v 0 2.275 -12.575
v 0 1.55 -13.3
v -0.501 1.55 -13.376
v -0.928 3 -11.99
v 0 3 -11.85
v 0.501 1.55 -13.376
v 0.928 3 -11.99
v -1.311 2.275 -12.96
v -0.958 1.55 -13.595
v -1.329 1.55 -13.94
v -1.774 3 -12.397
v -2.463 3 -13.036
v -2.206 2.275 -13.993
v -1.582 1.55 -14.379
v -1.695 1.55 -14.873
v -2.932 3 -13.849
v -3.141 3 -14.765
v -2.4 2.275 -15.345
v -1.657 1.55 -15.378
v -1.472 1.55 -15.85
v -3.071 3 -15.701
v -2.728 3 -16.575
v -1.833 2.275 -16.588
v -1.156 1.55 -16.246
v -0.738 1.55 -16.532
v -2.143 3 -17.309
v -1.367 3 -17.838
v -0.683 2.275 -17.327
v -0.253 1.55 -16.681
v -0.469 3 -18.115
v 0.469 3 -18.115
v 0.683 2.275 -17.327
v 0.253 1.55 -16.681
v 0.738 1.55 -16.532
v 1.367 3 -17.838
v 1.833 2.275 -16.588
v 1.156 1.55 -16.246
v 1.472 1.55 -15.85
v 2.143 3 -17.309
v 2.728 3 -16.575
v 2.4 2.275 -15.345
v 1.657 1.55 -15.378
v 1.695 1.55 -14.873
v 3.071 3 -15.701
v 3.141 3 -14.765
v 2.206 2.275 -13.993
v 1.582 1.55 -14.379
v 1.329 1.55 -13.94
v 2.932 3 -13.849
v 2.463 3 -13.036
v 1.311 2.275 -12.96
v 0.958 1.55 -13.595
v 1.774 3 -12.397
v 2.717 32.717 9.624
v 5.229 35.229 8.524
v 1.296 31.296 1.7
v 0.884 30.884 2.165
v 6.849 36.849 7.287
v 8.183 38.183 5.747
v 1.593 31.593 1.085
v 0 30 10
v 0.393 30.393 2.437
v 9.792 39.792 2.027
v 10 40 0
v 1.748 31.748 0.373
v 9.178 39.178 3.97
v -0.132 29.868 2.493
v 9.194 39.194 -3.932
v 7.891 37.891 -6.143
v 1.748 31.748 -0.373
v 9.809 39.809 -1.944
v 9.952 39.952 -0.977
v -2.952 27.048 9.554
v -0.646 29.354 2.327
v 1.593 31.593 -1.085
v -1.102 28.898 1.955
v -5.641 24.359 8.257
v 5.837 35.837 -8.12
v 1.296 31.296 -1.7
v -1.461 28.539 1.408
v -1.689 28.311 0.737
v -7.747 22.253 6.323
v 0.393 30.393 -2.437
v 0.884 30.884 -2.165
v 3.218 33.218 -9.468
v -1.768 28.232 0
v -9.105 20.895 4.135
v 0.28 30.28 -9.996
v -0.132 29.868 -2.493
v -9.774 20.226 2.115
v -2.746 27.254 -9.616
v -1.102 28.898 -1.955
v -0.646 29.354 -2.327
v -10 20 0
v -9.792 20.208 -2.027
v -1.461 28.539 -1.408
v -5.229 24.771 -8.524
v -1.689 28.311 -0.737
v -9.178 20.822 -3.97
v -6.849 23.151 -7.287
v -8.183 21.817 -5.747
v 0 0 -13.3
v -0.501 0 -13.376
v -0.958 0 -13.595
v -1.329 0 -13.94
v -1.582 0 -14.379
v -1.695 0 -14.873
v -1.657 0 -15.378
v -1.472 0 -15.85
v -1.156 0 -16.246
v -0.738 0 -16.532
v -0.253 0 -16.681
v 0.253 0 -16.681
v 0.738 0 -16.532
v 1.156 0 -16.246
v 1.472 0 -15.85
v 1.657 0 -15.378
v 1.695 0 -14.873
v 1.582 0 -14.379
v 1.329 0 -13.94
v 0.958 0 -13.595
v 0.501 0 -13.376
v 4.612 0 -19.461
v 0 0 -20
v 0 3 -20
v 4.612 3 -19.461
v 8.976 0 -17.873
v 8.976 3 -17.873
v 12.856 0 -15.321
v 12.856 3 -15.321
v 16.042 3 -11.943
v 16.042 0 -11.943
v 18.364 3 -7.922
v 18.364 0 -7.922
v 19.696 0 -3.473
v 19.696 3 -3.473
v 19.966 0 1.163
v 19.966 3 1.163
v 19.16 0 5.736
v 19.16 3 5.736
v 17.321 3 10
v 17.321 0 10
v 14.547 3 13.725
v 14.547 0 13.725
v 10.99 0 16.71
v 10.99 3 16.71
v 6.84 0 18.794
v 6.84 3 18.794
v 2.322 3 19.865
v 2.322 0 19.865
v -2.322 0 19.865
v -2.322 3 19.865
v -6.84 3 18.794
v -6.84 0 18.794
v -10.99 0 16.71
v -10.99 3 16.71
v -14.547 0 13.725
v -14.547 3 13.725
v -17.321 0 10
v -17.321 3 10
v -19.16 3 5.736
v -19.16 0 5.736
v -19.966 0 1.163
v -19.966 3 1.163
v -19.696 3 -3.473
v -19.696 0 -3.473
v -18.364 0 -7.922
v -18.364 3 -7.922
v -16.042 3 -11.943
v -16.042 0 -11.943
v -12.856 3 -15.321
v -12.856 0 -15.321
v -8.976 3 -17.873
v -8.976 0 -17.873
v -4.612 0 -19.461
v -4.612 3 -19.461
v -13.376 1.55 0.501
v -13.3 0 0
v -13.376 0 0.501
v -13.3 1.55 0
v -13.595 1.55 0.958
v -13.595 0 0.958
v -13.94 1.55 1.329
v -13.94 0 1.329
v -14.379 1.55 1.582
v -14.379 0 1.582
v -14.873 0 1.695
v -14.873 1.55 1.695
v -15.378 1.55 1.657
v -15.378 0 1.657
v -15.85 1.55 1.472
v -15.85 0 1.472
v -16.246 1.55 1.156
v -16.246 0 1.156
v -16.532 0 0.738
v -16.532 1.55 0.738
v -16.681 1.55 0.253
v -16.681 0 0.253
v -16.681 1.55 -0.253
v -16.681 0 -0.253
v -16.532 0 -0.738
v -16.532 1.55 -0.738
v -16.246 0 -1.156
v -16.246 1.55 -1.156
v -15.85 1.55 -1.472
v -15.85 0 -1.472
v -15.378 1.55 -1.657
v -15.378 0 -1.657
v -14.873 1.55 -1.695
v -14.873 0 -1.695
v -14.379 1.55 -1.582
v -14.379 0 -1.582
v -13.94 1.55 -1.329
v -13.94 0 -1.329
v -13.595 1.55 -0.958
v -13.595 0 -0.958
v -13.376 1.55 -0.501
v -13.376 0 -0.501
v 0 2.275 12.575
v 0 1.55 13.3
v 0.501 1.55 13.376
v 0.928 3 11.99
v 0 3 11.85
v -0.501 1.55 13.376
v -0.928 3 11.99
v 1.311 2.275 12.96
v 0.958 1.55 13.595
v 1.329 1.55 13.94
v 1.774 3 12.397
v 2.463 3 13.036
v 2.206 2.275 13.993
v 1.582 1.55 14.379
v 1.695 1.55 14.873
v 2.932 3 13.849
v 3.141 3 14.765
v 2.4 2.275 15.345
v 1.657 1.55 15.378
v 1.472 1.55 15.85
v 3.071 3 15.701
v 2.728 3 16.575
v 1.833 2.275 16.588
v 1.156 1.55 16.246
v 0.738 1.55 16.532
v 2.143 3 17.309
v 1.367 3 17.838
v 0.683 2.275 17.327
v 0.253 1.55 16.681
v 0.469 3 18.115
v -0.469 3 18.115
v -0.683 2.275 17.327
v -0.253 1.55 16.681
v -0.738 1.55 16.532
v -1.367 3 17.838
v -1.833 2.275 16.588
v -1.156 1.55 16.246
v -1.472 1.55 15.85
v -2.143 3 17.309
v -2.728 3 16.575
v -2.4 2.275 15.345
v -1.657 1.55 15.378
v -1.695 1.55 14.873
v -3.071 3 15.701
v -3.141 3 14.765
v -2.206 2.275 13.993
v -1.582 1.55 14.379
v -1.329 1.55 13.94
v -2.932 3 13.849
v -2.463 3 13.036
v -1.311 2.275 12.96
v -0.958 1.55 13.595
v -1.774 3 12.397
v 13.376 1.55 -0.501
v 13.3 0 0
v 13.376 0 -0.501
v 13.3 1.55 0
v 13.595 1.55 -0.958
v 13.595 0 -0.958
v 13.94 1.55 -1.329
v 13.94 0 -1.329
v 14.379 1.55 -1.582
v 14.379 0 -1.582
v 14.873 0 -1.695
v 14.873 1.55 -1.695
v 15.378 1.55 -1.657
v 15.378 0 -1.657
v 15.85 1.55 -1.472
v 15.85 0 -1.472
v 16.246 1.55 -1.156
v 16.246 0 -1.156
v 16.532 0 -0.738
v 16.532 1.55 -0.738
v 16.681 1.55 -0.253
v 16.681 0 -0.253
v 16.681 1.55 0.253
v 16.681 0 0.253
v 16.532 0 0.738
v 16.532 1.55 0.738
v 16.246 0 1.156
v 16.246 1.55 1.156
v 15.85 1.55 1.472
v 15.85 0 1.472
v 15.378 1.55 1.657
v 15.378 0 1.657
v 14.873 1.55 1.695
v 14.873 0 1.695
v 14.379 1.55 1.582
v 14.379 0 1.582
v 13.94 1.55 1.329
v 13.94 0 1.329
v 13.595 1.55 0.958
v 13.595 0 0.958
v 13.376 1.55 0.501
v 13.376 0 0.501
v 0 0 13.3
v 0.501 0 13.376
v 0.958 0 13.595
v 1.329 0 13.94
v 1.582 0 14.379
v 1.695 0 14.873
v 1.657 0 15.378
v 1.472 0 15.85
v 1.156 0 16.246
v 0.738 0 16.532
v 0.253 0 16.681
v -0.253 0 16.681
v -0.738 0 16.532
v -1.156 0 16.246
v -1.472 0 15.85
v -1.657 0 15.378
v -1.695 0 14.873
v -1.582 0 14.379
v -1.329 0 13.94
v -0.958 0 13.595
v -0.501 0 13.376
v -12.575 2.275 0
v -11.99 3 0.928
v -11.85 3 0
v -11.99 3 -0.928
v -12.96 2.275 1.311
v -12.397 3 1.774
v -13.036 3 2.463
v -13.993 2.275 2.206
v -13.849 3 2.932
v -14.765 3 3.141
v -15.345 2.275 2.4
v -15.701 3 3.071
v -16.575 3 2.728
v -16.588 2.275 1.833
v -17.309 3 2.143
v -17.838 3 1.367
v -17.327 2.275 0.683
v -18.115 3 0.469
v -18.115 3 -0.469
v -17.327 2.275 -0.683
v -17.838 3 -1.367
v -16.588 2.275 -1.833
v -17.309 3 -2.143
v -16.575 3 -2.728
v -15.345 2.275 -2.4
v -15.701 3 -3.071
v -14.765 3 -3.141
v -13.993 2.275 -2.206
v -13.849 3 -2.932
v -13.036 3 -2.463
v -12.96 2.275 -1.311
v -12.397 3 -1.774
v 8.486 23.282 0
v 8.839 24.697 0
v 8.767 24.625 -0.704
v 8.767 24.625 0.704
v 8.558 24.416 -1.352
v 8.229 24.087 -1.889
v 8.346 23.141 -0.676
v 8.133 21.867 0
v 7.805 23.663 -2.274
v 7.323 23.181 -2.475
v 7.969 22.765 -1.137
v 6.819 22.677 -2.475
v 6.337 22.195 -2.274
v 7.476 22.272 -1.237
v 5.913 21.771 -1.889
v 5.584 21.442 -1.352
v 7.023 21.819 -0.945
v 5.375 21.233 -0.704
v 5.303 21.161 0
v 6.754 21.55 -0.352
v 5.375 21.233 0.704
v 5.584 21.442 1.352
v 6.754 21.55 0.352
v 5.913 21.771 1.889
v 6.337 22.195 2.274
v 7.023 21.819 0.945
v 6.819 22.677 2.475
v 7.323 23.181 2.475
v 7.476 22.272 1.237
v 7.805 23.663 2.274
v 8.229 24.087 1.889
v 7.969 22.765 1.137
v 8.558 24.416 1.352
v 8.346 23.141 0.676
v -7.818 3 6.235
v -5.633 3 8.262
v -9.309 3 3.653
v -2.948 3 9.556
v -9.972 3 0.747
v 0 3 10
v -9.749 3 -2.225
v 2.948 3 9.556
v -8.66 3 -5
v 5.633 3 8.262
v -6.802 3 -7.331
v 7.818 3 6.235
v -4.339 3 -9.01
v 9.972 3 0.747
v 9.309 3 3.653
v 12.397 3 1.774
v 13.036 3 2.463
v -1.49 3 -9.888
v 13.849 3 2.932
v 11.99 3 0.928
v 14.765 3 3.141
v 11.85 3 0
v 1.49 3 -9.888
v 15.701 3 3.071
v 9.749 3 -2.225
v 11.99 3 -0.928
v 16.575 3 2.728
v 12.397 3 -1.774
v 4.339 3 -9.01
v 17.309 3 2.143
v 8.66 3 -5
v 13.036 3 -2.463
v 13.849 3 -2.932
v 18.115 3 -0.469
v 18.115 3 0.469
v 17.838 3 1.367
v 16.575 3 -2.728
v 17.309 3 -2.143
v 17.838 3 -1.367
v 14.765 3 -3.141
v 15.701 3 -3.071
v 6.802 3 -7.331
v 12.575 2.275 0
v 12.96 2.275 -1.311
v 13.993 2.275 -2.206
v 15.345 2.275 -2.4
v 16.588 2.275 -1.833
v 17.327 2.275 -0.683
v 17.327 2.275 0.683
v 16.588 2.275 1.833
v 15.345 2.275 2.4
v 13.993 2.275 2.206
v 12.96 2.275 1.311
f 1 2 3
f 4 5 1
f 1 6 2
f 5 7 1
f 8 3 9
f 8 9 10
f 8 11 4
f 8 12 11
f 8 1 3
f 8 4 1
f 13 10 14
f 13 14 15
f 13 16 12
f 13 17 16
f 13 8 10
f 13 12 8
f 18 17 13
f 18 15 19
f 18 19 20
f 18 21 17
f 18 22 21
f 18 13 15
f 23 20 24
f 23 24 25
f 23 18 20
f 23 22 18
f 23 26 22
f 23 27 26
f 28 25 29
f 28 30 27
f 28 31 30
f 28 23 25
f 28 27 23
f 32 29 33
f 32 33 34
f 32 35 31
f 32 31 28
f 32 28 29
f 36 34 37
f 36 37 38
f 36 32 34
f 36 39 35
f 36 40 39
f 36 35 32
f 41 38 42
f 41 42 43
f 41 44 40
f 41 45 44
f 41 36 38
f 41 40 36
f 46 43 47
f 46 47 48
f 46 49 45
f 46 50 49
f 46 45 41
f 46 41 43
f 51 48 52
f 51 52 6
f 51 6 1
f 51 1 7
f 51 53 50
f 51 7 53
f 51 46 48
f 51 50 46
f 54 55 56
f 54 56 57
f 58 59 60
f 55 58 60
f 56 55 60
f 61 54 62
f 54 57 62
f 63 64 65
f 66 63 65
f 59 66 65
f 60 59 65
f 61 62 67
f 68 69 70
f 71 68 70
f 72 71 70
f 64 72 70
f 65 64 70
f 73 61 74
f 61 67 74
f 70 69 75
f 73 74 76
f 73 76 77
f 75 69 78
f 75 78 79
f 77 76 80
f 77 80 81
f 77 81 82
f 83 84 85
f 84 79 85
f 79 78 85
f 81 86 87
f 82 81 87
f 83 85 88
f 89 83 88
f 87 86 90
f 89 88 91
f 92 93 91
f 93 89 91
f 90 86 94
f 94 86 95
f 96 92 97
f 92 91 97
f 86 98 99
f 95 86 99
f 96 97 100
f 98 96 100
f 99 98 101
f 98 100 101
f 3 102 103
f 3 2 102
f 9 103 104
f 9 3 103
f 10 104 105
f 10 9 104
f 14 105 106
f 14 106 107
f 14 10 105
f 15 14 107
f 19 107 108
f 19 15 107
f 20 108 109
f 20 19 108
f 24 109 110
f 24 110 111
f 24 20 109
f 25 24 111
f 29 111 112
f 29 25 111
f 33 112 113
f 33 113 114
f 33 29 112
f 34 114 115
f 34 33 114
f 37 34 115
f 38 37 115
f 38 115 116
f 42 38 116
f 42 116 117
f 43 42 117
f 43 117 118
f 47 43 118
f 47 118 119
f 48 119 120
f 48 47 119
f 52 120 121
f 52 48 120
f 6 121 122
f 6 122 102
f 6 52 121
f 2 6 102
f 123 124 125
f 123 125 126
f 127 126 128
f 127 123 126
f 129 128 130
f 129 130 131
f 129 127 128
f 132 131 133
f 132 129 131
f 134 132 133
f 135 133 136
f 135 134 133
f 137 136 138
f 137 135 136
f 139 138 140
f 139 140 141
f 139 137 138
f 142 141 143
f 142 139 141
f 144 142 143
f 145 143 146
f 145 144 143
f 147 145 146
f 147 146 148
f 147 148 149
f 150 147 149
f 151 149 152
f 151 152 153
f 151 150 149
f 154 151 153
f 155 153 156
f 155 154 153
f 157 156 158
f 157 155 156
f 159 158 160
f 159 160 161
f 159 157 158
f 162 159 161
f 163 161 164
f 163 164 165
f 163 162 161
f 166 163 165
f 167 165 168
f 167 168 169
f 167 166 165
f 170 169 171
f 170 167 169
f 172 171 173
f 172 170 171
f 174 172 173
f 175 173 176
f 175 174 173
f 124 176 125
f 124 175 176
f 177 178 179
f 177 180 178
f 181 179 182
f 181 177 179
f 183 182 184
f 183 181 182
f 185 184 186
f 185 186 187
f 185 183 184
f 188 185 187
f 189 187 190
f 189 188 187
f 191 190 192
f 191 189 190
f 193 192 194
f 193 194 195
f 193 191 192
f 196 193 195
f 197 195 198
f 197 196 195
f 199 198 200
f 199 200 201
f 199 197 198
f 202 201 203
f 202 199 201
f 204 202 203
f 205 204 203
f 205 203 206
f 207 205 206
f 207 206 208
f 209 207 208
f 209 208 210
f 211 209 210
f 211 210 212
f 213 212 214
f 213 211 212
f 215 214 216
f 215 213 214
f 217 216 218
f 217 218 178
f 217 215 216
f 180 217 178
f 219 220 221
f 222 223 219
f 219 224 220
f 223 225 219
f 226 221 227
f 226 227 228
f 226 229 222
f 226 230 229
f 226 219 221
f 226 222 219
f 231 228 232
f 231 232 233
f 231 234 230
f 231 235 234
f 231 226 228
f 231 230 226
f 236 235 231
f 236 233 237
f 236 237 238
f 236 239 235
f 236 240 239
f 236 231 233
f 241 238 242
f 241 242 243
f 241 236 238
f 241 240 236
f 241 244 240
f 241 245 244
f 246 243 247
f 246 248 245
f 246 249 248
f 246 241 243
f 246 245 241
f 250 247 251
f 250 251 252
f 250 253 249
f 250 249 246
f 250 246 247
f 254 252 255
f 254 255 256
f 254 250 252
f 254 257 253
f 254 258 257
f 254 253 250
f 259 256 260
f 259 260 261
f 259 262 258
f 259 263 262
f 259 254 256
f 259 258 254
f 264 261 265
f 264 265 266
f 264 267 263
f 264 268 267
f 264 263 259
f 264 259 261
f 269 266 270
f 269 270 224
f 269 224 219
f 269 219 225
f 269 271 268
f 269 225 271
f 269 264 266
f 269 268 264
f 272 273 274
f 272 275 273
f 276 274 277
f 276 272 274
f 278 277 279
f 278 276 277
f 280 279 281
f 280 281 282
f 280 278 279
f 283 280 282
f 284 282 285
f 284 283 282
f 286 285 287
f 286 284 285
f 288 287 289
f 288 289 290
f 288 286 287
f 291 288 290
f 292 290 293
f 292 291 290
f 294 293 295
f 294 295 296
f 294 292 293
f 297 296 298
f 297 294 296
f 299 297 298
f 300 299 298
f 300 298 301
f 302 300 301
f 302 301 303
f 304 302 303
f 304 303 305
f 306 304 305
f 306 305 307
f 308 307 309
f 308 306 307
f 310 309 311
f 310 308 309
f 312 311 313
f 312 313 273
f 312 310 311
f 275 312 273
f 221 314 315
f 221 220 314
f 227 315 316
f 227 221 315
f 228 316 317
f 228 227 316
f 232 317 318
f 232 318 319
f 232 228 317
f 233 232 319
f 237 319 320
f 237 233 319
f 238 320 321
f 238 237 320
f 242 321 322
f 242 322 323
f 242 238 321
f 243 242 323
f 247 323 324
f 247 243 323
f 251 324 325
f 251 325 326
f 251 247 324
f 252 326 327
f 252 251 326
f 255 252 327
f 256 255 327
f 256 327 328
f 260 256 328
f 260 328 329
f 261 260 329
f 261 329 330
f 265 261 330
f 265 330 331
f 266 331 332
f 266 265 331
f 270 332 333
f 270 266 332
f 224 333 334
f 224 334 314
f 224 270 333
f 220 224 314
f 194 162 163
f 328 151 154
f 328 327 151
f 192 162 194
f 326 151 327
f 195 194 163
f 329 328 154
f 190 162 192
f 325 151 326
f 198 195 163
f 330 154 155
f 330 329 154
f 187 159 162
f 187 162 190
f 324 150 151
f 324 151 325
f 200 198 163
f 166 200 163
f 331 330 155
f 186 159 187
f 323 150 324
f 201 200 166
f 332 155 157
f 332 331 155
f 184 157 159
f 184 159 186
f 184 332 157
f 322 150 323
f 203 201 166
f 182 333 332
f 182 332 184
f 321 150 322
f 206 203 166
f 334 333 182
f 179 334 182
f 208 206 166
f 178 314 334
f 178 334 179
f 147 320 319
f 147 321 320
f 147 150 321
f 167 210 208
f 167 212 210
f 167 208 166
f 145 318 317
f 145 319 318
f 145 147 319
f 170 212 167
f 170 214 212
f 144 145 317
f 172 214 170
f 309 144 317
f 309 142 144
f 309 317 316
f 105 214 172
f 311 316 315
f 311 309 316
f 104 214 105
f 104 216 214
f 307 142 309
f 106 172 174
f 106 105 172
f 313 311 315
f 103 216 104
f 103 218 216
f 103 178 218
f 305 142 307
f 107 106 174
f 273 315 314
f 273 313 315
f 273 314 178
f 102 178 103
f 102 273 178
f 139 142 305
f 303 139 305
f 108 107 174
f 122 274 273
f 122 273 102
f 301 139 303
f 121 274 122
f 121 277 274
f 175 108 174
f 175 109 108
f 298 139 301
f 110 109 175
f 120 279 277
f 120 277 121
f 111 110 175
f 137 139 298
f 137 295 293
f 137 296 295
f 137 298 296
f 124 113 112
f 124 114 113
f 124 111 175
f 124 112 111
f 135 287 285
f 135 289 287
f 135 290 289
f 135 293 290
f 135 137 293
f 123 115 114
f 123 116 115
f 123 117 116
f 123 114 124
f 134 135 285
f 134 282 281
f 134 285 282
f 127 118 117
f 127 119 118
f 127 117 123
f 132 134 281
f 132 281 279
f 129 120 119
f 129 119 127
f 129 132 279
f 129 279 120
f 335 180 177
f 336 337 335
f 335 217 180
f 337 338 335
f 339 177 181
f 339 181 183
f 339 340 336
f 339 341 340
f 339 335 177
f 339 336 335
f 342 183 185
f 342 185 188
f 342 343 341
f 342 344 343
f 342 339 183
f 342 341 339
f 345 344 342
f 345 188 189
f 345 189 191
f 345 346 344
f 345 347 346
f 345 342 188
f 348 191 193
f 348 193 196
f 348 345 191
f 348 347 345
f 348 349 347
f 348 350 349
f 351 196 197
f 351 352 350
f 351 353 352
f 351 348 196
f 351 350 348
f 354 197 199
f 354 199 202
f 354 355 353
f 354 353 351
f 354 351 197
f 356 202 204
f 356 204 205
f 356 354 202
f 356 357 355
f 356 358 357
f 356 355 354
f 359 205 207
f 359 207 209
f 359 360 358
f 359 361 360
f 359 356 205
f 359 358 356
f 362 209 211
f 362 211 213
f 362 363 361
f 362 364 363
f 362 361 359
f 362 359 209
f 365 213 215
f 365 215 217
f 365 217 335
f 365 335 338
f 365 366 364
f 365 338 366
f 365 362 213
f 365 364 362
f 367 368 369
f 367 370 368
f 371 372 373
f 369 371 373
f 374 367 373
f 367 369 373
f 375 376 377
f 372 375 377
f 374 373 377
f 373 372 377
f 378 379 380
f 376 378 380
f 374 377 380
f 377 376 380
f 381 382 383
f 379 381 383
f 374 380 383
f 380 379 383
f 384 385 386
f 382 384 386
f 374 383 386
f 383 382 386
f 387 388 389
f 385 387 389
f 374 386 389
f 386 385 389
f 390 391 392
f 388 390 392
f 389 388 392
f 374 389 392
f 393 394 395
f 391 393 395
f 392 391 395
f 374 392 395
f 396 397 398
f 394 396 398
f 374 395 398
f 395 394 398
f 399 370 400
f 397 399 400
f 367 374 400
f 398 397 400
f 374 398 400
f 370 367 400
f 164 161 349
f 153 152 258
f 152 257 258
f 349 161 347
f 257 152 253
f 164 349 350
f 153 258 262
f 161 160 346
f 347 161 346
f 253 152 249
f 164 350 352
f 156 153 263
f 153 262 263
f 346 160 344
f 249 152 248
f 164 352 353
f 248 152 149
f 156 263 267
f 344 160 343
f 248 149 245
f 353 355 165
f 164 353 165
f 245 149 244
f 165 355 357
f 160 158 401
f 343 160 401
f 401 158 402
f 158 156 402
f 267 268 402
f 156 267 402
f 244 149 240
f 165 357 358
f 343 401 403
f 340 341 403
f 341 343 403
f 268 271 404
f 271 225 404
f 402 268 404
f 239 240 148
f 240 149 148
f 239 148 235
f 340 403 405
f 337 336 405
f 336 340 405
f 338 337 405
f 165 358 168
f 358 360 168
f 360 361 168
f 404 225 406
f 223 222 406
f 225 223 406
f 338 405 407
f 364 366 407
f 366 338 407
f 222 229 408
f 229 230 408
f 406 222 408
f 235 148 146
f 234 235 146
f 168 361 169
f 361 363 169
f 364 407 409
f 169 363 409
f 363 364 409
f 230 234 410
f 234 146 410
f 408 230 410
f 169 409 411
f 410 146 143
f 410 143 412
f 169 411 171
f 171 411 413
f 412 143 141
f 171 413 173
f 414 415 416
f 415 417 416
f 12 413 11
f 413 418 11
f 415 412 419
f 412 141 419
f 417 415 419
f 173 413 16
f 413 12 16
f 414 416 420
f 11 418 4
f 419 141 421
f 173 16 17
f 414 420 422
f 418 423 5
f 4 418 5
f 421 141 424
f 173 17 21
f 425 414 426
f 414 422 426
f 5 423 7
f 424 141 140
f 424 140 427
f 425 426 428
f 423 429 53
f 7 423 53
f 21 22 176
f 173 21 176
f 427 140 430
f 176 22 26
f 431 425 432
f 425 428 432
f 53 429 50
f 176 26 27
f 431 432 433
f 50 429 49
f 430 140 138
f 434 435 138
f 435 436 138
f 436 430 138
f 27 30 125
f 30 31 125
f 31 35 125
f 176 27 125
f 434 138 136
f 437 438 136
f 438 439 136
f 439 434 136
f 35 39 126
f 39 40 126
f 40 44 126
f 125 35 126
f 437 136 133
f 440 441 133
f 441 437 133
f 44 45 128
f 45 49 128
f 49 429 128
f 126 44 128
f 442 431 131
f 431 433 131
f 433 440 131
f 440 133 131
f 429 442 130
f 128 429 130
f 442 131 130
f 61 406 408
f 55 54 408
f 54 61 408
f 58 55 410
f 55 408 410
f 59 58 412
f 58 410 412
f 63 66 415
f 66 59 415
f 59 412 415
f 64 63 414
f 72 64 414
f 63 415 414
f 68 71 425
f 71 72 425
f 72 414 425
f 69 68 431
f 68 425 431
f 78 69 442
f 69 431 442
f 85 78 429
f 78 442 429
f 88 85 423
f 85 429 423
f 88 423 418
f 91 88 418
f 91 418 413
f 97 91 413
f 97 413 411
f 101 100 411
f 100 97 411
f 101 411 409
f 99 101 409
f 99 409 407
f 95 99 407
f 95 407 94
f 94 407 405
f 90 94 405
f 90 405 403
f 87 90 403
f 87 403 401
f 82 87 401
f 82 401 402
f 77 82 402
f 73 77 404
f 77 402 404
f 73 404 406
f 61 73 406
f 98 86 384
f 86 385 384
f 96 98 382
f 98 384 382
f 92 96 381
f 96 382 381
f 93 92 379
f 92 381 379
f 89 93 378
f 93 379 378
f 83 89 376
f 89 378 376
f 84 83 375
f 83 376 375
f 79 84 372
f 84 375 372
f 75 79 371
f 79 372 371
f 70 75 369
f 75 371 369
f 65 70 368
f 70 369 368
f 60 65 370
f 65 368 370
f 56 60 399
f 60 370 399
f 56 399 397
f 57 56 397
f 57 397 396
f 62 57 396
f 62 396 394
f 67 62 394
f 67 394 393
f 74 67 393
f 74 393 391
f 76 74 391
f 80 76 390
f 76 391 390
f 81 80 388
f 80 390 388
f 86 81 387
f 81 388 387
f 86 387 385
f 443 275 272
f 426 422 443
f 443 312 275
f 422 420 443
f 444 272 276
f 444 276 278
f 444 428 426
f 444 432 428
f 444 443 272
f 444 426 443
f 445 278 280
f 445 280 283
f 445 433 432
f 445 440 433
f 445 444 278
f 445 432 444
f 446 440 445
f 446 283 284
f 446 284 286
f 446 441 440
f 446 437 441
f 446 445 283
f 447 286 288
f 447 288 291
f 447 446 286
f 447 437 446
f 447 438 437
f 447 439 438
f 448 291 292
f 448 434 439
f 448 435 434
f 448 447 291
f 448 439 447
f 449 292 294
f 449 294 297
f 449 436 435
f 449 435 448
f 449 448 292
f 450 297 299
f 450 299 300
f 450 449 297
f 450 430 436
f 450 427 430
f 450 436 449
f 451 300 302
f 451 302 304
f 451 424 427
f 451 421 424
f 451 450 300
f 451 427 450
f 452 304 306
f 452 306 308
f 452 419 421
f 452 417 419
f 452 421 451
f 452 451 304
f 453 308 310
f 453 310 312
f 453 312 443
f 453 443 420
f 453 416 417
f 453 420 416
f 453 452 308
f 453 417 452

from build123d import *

# Parameters (mm, degrees)
SKETCH1_R               = 10
BOSS_EXTRUDE1_DEPTH     = 40
SKETCH2_R               = 20
BOSS_EXTRUDE2_DEPTH     = 3
CIRPATTERN1_COUNT       = 4
CUT_EXTRUDE1_DEPTH      = 49.989794856
CUT_EXTRUDE1_DEPTH_BACK = 49.989794856
M6_TAPPED_HOLE1_D       = 5
M6_TAPPED_HOLE1_DEPTH   = 10
M6_TAPPED_HOLE1_TIP     = 1.502151548


with BuildPart() as part:
    # Sketch1 → Boss-Extrude1 (new body)
    with BuildSketch(Plane(origin=(0, 0, 0), x_dir=(1, 0, 0), z_dir=(0, 1, 0))):
        Circle(SKETCH1_R)
    extrude(amount=BOSS_EXTRUDE1_DEPTH)

    # Sketch2 → Boss-Extrude2 (add)
    with BuildSketch(Plane.XZ):
        Circle(SKETCH2_R)
    extrude(amount=-BOSS_EXTRUDE2_DEPTH)

    # Sketch3 → CSK for M3 Countersunk Flat Head Screw1 (revolve, cut)
    with BuildSketch(Plane(origin=(0, 3, -15), x_dir=(0, 0, 1), z_dir=(1, 0, 0))):
        Polygon((0, 0), (0, 3), (1.7, 3), (1.7, 1.45), (3.15, 0), align=None)
    csk_for_m3_countersunk_flat_head_screw1 = revolve(axis=Axis((0, 9.35, -15), (0, -1, 0)), mode=Mode.SUBTRACT)

    # CirPattern1: CSK for M3 Countersunk Flat Head Screw1 ×4 about axis
    cirpattern1_axis = Axis((0, 3, 0), (0, -1, 0))
    for i in range(1, CIRPATTERN1_COUNT):
        add(csk_for_m3_countersunk_flat_head_screw1.rotate(cirpattern1_axis, i * 360 / CIRPATTERN1_COUNT), mode=Mode.SUBTRACT)

    # Sketch5 → Cut-Extrude1 (cut, two sides: drawn at the far end of the back side and taken through both)
    with BuildSketch(Plane.XY.offset(-CUT_EXTRUDE1_DEPTH_BACK)):
        Polygon((-10, 40), (10, 40), (-10, 20), align=None)
    extrude(amount=CUT_EXTRUDE1_DEPTH + CUT_EXTRUDE1_DEPTH_BACK, mode=Mode.SUBTRACT)

    # M6 Tapped Hole1
    with Locations(Plane(origin=(-15, 15, 0), x_dir=(0.7071067811865475, 0.7071067811865477, 0), z_dir=(-0.7071067811865477, 0.7071067811865475, 0))):
        with Locations((21.213203436, 0)):
            Hole(M6_TAPPED_HOLE1_D / 2, depth=M6_TAPPED_HOLE1_DEPTH)
            with Locations((0, 0, -(M6_TAPPED_HOLE1_DEPTH + M6_TAPPED_HOLE1_TIP / 2))):  # 118° drill point
                Cone(0, M6_TAPPED_HOLE1_D / 2, M6_TAPPED_HOLE1_TIP, mode=Mode.SUBTRACT)


solid = part.part
